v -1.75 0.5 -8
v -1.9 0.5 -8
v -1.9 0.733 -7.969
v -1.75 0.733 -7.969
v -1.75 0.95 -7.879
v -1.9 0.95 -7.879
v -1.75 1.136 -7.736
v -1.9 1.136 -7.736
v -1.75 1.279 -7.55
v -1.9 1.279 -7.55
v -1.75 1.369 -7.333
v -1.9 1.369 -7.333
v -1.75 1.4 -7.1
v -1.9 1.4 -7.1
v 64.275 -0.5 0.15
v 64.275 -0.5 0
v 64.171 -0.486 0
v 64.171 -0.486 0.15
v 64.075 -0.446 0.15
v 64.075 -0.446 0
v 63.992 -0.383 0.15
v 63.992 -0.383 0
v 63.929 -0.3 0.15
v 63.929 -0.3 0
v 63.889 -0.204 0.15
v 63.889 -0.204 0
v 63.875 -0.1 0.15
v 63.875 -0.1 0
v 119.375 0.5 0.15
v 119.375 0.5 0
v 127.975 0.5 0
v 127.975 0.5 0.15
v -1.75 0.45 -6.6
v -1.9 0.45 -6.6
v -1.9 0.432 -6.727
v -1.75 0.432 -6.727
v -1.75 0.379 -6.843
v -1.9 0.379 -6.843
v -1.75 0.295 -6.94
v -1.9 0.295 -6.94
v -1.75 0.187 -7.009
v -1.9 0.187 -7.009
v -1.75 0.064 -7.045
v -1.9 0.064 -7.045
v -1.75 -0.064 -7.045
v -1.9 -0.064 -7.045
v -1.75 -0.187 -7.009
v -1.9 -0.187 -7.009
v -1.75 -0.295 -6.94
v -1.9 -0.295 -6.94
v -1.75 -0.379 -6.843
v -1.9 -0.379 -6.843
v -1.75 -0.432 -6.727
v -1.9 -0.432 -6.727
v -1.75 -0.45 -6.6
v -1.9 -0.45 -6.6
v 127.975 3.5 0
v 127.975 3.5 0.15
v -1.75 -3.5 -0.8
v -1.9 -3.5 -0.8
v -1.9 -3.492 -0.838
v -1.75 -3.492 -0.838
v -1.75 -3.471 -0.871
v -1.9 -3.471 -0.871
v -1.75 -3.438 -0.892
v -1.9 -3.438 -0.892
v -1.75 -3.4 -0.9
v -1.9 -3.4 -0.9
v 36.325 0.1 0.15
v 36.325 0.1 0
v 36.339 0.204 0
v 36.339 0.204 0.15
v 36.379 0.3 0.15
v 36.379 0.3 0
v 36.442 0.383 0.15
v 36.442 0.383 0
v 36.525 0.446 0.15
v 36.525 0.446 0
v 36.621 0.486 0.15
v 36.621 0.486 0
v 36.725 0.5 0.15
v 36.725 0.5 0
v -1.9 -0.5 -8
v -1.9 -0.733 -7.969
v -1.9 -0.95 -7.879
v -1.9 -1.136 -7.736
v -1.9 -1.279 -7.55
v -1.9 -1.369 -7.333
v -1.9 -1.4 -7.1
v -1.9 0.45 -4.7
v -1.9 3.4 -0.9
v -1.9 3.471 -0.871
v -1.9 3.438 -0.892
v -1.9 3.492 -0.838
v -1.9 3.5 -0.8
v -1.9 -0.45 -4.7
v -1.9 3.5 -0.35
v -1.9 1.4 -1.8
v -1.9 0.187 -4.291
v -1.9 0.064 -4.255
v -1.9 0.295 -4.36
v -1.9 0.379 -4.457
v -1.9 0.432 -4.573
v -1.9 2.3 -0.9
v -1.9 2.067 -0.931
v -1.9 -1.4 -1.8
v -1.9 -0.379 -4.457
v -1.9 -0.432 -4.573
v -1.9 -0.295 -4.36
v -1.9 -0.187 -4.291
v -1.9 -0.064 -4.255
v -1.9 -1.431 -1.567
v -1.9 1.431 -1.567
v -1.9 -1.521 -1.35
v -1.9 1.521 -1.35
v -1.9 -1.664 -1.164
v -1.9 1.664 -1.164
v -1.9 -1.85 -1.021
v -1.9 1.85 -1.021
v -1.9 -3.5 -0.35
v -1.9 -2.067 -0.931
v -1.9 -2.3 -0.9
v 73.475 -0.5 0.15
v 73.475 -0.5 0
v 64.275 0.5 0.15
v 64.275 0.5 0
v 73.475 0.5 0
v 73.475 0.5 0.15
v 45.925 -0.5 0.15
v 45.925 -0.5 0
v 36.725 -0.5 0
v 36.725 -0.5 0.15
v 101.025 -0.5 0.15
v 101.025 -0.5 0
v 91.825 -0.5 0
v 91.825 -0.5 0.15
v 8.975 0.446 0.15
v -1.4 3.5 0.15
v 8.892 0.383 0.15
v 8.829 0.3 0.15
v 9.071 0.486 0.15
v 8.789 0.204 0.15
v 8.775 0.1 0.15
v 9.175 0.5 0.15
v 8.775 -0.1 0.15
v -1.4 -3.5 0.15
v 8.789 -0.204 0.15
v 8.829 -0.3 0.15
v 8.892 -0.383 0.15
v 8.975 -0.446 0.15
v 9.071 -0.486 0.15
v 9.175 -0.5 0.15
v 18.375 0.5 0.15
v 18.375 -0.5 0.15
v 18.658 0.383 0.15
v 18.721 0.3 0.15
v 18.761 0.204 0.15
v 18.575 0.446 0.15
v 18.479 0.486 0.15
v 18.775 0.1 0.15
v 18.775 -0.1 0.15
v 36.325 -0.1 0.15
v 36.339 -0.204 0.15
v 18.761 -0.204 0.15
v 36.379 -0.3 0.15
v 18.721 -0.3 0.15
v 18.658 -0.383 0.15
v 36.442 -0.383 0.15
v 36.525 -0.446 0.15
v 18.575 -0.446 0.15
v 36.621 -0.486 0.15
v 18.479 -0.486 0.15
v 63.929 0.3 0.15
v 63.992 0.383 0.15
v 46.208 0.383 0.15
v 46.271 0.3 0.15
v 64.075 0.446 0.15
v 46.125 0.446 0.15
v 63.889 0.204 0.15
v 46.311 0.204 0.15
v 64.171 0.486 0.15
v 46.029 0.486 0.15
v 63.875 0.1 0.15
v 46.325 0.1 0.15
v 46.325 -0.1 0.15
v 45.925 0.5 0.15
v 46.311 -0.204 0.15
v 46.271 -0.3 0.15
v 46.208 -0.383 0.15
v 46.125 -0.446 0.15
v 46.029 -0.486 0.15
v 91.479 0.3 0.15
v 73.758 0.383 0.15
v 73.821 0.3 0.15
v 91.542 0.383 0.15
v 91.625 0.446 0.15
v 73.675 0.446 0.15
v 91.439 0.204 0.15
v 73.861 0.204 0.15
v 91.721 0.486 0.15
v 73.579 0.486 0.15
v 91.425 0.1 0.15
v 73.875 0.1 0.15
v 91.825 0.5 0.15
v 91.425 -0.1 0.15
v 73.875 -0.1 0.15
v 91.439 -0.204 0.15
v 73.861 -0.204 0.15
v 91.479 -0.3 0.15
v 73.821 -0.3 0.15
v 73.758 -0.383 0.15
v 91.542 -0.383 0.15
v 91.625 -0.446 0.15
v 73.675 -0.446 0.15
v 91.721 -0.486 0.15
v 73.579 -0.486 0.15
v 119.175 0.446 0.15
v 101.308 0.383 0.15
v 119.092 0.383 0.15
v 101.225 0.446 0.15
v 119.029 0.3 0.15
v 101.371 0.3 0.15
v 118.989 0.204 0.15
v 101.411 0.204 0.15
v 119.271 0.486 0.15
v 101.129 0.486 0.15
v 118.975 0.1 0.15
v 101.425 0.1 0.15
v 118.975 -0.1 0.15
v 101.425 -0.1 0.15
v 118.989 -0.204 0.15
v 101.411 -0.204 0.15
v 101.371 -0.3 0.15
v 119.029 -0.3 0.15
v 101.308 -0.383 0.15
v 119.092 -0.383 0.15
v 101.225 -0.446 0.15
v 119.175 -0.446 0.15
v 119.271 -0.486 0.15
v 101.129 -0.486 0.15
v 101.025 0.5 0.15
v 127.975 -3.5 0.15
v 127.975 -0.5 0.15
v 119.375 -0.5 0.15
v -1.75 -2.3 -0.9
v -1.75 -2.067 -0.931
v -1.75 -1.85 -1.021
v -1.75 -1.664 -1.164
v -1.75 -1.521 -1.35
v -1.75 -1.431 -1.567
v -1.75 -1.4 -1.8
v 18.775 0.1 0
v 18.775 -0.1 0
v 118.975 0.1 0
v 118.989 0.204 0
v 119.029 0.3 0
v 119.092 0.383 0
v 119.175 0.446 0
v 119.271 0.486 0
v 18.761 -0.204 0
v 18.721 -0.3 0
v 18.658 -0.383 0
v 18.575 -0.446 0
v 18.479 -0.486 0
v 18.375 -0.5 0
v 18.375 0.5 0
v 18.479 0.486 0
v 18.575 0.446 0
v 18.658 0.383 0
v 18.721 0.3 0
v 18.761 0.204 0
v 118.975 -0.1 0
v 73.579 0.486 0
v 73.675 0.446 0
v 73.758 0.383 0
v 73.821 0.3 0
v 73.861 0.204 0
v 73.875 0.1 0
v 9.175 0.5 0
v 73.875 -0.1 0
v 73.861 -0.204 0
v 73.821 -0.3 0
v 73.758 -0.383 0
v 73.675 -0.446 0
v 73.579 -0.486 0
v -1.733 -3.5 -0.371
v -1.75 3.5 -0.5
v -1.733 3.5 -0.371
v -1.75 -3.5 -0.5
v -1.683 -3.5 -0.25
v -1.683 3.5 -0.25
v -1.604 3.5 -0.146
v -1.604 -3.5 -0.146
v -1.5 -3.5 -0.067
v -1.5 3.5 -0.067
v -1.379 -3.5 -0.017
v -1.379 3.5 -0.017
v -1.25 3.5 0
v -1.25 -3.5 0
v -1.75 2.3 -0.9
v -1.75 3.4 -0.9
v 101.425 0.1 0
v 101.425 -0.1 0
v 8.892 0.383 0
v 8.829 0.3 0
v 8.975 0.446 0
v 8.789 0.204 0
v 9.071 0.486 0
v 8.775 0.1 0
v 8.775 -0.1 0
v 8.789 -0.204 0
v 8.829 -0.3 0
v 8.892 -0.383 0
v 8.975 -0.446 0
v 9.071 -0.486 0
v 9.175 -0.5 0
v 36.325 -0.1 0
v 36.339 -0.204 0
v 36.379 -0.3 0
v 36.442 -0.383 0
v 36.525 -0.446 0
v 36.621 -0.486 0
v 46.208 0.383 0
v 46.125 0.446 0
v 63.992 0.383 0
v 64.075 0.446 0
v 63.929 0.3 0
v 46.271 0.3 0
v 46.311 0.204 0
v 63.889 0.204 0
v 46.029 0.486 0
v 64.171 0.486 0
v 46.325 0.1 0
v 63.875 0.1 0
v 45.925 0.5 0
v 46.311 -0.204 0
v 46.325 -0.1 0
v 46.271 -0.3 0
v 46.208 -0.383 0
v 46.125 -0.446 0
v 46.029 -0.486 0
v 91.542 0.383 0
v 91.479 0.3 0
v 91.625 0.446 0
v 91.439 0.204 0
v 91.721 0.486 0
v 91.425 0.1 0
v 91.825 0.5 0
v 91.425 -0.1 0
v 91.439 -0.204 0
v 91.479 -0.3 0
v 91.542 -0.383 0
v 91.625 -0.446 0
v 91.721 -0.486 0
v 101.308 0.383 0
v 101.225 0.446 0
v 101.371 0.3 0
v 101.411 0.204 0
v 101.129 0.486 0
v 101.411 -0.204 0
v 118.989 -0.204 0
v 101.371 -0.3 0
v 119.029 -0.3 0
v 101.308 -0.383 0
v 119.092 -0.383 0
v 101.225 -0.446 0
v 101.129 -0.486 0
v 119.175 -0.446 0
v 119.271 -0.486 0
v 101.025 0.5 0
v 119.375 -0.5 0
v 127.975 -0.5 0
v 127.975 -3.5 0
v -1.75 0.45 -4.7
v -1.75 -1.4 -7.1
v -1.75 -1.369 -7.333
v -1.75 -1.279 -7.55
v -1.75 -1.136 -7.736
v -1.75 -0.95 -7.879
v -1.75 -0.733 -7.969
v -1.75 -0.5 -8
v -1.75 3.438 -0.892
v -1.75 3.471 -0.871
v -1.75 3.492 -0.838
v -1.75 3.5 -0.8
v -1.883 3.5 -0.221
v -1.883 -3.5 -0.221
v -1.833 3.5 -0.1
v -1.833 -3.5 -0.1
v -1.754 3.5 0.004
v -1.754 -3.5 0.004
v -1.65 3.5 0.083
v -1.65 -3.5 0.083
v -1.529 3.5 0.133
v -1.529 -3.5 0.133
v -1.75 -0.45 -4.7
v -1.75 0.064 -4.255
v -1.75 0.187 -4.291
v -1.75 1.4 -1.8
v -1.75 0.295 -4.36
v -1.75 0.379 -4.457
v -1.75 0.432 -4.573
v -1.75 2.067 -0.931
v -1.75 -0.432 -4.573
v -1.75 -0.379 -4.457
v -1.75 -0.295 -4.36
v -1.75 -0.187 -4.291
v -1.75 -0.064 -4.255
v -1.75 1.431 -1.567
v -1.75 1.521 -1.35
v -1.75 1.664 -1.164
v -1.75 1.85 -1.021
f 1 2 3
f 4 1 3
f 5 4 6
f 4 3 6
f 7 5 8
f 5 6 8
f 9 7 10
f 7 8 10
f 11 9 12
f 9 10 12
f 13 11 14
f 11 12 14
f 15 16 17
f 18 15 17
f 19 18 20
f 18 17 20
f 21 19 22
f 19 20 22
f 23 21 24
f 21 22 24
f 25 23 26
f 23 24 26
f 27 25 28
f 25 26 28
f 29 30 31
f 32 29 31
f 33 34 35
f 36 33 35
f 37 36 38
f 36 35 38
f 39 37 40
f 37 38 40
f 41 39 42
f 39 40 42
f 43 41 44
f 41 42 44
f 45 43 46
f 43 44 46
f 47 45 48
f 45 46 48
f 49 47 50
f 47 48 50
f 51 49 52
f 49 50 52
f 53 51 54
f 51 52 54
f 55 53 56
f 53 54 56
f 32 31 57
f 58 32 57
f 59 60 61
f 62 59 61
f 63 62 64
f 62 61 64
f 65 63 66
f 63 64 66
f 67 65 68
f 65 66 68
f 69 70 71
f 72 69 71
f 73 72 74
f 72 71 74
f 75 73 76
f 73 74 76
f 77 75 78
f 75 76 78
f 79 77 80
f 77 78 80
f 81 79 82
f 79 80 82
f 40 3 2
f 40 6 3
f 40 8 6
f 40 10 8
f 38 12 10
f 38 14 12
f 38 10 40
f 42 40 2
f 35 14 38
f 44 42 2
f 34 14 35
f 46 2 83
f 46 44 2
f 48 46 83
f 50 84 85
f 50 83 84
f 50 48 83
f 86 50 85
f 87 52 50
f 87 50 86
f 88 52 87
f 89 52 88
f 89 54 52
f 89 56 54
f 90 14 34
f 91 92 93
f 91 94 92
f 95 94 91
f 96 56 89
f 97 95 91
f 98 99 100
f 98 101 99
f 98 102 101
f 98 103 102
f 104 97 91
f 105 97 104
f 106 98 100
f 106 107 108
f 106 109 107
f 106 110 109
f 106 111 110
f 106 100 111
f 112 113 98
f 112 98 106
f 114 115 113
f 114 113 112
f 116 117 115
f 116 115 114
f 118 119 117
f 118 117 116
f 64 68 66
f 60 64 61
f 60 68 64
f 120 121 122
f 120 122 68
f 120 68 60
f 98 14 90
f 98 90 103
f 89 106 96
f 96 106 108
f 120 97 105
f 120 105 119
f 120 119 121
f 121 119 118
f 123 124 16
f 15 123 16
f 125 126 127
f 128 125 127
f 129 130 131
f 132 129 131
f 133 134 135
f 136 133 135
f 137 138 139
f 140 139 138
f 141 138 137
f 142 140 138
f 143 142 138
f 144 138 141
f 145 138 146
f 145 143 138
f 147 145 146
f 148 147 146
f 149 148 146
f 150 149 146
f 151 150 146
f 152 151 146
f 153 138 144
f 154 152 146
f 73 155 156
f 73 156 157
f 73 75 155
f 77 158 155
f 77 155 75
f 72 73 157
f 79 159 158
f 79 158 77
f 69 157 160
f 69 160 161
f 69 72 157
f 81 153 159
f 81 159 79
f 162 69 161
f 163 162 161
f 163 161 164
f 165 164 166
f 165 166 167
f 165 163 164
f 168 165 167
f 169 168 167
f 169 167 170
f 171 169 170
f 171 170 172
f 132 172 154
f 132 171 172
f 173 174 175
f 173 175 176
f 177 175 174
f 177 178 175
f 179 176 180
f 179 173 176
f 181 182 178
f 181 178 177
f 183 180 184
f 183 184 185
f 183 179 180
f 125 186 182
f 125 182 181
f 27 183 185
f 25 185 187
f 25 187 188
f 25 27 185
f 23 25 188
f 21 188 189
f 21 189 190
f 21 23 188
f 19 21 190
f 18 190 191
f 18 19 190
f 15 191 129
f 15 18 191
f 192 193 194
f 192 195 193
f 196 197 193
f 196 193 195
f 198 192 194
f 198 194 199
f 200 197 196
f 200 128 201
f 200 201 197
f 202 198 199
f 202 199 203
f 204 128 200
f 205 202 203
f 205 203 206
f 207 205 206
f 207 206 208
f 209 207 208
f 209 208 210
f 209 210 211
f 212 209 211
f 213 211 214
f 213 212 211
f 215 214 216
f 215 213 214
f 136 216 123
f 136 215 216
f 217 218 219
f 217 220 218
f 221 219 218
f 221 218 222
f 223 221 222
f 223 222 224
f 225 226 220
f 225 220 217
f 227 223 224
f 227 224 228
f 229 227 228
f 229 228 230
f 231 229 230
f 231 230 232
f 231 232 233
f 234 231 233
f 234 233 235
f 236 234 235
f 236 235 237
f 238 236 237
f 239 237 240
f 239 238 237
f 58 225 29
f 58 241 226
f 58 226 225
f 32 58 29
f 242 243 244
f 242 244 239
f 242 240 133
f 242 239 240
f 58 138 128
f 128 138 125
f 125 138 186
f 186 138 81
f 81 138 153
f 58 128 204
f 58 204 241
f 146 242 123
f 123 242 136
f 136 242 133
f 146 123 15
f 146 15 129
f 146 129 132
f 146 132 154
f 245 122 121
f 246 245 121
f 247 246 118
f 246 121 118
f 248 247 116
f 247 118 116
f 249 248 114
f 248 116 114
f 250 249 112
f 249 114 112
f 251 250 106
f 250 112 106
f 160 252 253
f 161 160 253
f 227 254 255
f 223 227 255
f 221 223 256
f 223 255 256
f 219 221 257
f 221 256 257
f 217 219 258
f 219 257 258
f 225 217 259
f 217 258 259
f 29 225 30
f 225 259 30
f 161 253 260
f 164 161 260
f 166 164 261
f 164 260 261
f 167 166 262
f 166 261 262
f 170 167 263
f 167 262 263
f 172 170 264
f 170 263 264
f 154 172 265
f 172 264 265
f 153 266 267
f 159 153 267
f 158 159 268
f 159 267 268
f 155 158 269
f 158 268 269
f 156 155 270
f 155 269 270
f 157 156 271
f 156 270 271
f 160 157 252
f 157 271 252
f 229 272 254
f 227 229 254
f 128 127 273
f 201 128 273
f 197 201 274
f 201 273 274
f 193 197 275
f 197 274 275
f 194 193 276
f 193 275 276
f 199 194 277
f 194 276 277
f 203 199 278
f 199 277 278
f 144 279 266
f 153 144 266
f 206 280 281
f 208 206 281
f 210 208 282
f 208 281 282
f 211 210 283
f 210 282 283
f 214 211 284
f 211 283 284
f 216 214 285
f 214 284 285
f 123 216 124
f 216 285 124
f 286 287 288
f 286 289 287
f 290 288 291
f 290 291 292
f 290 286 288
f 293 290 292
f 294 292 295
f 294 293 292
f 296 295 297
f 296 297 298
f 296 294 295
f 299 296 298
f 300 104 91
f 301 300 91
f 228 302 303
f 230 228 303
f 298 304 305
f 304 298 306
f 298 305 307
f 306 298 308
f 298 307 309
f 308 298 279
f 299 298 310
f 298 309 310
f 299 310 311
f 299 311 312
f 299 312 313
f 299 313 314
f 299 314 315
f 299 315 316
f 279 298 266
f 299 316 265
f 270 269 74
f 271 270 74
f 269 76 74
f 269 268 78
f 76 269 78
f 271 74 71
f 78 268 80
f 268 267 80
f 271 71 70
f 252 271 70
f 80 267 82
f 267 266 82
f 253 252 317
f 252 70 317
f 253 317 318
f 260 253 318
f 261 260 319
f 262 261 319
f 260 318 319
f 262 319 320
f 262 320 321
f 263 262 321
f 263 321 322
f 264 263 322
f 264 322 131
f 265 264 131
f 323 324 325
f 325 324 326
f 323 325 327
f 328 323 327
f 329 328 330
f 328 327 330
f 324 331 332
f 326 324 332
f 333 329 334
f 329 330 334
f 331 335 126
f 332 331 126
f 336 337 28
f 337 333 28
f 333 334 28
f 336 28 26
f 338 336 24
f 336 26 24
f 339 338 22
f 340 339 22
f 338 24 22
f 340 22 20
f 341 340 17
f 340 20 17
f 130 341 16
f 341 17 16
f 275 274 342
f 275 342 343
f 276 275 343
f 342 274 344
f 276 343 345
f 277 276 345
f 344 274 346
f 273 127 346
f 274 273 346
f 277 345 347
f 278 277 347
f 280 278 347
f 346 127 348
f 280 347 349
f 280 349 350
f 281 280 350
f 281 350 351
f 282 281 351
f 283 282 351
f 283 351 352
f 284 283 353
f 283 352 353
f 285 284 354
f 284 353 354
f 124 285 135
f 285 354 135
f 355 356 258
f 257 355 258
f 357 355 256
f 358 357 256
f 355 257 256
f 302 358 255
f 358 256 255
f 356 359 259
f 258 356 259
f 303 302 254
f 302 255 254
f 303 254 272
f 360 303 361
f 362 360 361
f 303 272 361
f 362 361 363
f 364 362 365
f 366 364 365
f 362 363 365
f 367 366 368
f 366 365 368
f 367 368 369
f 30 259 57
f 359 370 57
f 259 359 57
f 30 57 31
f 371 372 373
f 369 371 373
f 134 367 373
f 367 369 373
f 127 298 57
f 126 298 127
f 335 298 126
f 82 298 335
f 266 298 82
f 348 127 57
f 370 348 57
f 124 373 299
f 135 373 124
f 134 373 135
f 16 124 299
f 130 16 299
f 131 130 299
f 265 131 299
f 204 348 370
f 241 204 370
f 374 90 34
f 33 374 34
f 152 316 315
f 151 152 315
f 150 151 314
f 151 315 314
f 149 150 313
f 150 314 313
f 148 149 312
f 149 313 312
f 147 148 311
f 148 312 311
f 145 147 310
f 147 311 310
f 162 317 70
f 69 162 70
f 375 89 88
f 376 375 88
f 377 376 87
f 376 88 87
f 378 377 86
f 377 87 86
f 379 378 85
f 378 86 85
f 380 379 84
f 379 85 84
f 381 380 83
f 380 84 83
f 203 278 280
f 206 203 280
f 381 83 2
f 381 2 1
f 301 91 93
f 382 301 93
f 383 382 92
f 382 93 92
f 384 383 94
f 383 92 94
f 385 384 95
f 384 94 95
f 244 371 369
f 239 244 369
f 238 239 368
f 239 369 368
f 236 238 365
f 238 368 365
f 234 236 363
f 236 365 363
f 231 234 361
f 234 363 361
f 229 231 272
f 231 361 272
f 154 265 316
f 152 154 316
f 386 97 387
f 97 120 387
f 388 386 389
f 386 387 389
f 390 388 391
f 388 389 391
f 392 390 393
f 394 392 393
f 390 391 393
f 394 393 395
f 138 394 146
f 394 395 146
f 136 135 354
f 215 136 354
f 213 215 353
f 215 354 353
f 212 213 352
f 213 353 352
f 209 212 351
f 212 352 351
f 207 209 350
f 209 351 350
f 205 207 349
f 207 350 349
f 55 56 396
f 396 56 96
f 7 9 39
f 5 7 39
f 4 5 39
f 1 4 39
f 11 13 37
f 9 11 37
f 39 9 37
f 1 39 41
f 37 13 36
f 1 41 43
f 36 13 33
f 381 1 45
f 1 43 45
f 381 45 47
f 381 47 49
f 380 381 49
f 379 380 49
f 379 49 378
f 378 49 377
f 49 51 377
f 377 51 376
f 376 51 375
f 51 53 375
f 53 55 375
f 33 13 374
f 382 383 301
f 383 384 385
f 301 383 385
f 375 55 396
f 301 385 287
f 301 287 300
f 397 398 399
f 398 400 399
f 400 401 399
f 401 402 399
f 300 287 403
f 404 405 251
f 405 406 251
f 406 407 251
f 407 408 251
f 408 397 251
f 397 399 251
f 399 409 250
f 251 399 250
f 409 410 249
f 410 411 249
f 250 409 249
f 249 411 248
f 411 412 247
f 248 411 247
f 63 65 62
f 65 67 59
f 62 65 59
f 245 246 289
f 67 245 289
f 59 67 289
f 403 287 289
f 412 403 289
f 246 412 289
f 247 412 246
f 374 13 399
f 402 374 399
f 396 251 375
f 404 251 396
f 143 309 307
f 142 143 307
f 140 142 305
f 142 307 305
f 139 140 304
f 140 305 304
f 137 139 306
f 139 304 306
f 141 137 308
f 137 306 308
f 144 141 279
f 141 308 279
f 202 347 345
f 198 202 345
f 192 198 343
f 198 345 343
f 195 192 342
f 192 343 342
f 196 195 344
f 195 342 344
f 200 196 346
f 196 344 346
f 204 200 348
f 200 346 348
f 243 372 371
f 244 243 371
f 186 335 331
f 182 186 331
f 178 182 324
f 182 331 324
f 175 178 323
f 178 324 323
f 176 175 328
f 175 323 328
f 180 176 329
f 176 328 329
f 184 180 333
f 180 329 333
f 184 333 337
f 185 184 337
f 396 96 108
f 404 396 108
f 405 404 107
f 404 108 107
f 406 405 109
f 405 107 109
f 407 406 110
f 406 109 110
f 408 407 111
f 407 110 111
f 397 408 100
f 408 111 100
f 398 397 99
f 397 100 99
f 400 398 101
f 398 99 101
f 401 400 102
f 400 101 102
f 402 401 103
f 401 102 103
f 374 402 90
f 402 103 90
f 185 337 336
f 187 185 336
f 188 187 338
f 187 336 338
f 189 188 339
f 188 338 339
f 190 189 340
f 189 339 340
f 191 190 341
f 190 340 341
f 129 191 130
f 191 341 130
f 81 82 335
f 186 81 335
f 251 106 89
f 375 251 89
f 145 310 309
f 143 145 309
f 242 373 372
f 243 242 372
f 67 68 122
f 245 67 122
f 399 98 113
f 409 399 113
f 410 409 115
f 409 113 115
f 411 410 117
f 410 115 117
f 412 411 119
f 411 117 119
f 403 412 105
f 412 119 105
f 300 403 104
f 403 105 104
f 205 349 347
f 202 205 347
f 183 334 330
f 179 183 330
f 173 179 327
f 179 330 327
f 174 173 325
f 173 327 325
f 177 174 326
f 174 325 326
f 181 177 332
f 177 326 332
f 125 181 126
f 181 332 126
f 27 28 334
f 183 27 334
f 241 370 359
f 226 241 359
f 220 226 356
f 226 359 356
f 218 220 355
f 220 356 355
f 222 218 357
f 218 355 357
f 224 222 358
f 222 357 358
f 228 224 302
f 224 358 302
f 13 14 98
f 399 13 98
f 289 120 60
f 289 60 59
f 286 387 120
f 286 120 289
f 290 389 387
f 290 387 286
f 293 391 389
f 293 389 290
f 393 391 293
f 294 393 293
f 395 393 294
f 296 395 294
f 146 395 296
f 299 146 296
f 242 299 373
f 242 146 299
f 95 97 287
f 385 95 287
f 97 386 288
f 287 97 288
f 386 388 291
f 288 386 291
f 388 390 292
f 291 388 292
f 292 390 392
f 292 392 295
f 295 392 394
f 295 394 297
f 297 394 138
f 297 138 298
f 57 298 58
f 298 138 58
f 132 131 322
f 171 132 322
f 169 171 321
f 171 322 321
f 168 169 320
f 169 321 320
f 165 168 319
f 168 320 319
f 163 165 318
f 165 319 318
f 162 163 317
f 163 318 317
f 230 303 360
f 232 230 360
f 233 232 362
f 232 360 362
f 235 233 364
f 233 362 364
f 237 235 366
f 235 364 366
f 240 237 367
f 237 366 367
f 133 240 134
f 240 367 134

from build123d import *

# Parameters (mm, degrees)
F0_W     = 4
F0_H     = 3
F1_DEPTH = 0.15
F2_DEPTH = 1.9
F3_W     = 0.15
F3_H     = 7
F4_DEPTH = 8
F6_DEPTH = 25
F7_R     = 0.5


with BuildPart() as f1:
    # F0 (on Top) → F1 (new body)
    with BuildSketch(Plane.XY):
        with BuildLine():
            Line((96.425, -0.5), (96.425, -3.5))
            Line((96.425, -3.5), (100.425, -3.5))
            Line((100.425, -3.5), (110.2, -3.5))
            Line((110.2, -3.5), (123.975, -3.5))
            Line((123.975, -3.5), (123.975, -0.5))
            Line((123.975, -0.5), (119.375, -0.5))
            ThreePointArc((119.375, -0.5), (119.0921572875, -0.3828427125), (118.975, -0.1))
            Line((118.975, -0.1), (118.975, 0.1))
            ThreePointArc((118.975, 0.1), (119.0921572875, 0.3828427125), (119.375, 0.5))
            Line((119.375, 0.5), (123.975, 0.5))
            Line((123.975, 0.5), (123.975, 3.5))
            Line((123.975, 3.5), (110.2, 3.5))
            Line((110.2, 3.5), (100.425, 3.5))
            Line((100.425, 3.5), (96.425, 3.5))
            Line((96.425, 3.5), (96.425, 0.5))
            Line((96.425, 0.5), (101.025, 0.5))
            ThreePointArc((101.025, 0.5), (101.3078427125, 0.3828427125), (101.425, 0.1))
            Line((101.425, 0.1), (101.425, -0.1))
            ThreePointArc((101.425, -0.1), (101.3078427125, -0.3828427125), (101.025, -0.5))
            Line((101.025, -0.5), (96.425, -0.5))
        make_face()
        with BuildLine():
            Line((13.775, -0.5), (13.775, -3.5))
            Line((13.775, -3.5), (27.55, -3.5))
            Line((27.55, -3.5), (41.325, -3.5))
            Line((41.325, -3.5), (41.325, -0.5))
            Line((41.325, -0.5), (36.725, -0.5))
            ThreePointArc((36.725, -0.5), (36.4421572875, -0.3828427125), (36.325, -0.1))
            Line((36.325, -0.1), (36.325, 0.1))
            ThreePointArc((36.325, 0.1), (36.4421572875, 0.3828427125), (36.725, 0.5))
            Line((36.725, 0.5), (41.325, 0.5))
            Line((41.325, 0.5), (41.325, 3.5))
            Line((41.325, 3.5), (27.55, 3.5))
            Line((27.55, 3.5), (13.775, 3.5))
            Line((13.775, 3.5), (13.775, 0.5))
            Line((13.775, 0.5), (18.375, 0.5))
            ThreePointArc((18.375, 0.5), (18.6578427125, 0.3828427125), (18.775, 0.1))
            Line((18.775, 0.1), (18.775, -0.1))
            ThreePointArc((18.775, -0.1), (18.6578427125, -0.3828427125), (18.375, -0.5))
            Line((18.375, -0.5), (13.775, -0.5))
        make_face()
        with BuildLine():
            Line((41.325, -0.5), (41.325, -3.5))
            Line((41.325, -3.5), (55.1, -3.5))
            Line((55.1, -3.5), (68.875, -3.5))
            Line((68.875, -3.5), (68.875, -0.5))
            Line((68.875, -0.5), (64.275, -0.5))
            ThreePointArc((64.275, -0.5), (63.9921572875, -0.3828427125), (63.875, -0.1))
            Line((63.875, -0.1), (63.875, 0.1))
            ThreePointArc((63.875, 0.1), (63.9921572875, 0.3828427125), (64.275, 0.5))
            Line((64.275, 0.5), (68.875, 0.5))
            Line((68.875, 0.5), (68.875, 3.5))
            Line((68.875, 3.5), (55.1, 3.5))
            Line((55.1, 3.5), (41.325, 3.5))
            Line((41.325, 3.5), (41.325, 0.5))
            Line((41.325, 0.5), (45.925, 0.5))
            ThreePointArc((45.925, 0.5), (46.2078427125, 0.3828427125), (46.325, 0.1))
            Line((46.325, 0.1), (46.325, -0.1))
            ThreePointArc((46.325, -0.1), (46.2078427125, -0.3828427125), (45.925, -0.5))
            Line((45.925, -0.5), (41.325, -0.5))
        make_face()
        with BuildLine():
            Line((68.875, -0.5), (68.875, -3.5))
            Line((68.875, -3.5), (82.65, -3.5))
            Line((82.65, -3.5), (96.425, -3.5))
            Line((96.425, -3.5), (96.425, -0.5))
            Line((96.425, -0.5), (91.825, -0.5))
            ThreePointArc((91.825, -0.5), (91.5421572875, -0.3828427125), (91.425, -0.1))
            Line((91.425, -0.1), (91.425, 0.1))
            ThreePointArc((91.425, 0.1), (91.5421572875, 0.3828427125), (91.825, 0.5))
            Line((91.825, 0.5), (96.425, 0.5))
            Line((96.425, 0.5), (96.425, 3.5))
            Line((96.425, 3.5), (82.65, 3.5))
            Line((82.65, 3.5), (68.875, 3.5))
            Line((68.875, 3.5), (68.875, 0.5))
            Line((68.875, 0.5), (73.475, 0.5))
            ThreePointArc((73.475, 0.5), (73.7578427125, 0.3828427125), (73.875, 0.1))
            Line((73.875, 0.1), (73.875, -0.1))
            ThreePointArc((73.875, -0.1), (73.7578427125, -0.3828427125), (73.475, -0.5))
            Line((73.475, -0.5), (68.875, -0.5))
        make_face()
        with BuildLine():
            Line((0, 3.5), (0, -3.5))
            Line((0, -3.5), (13.775, -3.5))
            Line((13.775, -3.5), (13.775, -0.5))
            Line((13.775, -0.5), (9.175, -0.5))
            ThreePointArc((9.175, -0.5), (8.8921572875, -0.3828427125), (8.775, -0.1))
            Line((8.775, -0.1), (8.775, 0.1))
            ThreePointArc((8.775, 0.1), (8.8921572875, 0.3828427125), (9.175, 0.5))
            Line((9.175, 0.5), (13.775, 0.5))
            Line((13.775, 0.5), (13.775, 3.5))
            Line((13.775, 3.5), (0, 3.5))
        make_face()
        with Locations((125.975, -2)):
            Rectangle(F0_W, F0_H)
        with Locations((125.975, 2)):
            Rectangle(F0_W, F0_H)
    extrude(amount=F1_DEPTH)

    # F2 (add): a face of the model
    f2_faces = [f1.faces().sort_by_distance(p)[0] for p in [
        (0, 0, 0.075),
    ]]
    extrude(f2_faces, amount=F2_DEPTH)

    # F3 (on face) → F4 (join)
    with BuildSketch(Plane(origin=(0, 0, 0), x_dir=(1, 0, 0), z_dir=(0, 0, -1))):
        with Locations((-1.825, 0)):
            Rectangle(F3_W, F3_H)
    extrude(amount=F4_DEPTH)

    # F5 (on face) → F6 (cut)
    with BuildSketch(Plane(origin=(-1.9, 0, 0), x_dir=(0, -1, 0), z_dir=(-1, 0, 0))):
        with BuildLine():
            ThreePointArc((1.4, -7.1), (1.1363961031, -7.7363961031), (0.5, -8))
            Line((0.5, -8), (3.5, -8))
            Line((3.5, -8), (3.5, -0.8))
            ThreePointArc((3.5, -0.8), (3.4707106781, -0.8707106781), (3.4, -0.9))
            Line((3.4, -0.9), (2.3, -0.9))
            ThreePointArc((2.3, -0.9), (1.6636038969, -1.1636038969), (1.4, -1.8))
            Line((1.4, -1.8), (1.4, -7.1))
        make_face()
        with BuildLine():
            Line((-3.5, -8), (-0.5, -8))
            ThreePointArc((-0.5, -8), (-1.1363961031, -7.7363961031), (-1.4, -7.1))
            Line((-1.4, -7.1), (-1.4, -1.8))
            ThreePointArc((-1.4, -1.8), (-1.6636038969, -1.1636038969), (-2.3, -0.9))
            Line((-2.3, -0.9), (-3.4, -0.9))
            ThreePointArc((-3.4, -0.9), (-3.4707106781, -0.8707106781), (-3.5, -0.8))
            Line((-3.5, -0.8), (-3.5, -8))
        make_face()
        with BuildLine():
            ThreePointArc((-0.45, -4.7), (0, -5.15), (0.45, -4.7))
            ThreePointArc((0.45, -4.7), (0, -4.25), (-0.45, -4.7))
        make_face()
        with BuildLine():
            ThreePointArc((-0.45, -6.6), (0, -6.15), (0.45, -6.6))
            Line((0.45, -6.6), (0.45, -4.7))
            ThreePointArc((0.45, -4.7), (0, -5.15), (-0.45, -4.7))
            Line((-0.45, -4.7), (-0.45, -6.6))
        make_face()
        with BuildLine():
            ThreePointArc((-0.45, -6.6), (0, -7.05), (0.45, -6.6))
            ThreePointArc((0.45, -6.6), (0, -6.15), (-0.45, -6.6))
        make_face()
    extrude(amount=-F6_DEPTH, mode=Mode.SUBTRACT)

    # F7
    f7_edges = [f1.edges().sort_by_distance(p)[0] for p in [
        (-1.9, 0, 0.15),
        (-1.75, 0, 0),
    ]]
    fillet(f7_edges, radius=F7_R)


solid = f1.part
